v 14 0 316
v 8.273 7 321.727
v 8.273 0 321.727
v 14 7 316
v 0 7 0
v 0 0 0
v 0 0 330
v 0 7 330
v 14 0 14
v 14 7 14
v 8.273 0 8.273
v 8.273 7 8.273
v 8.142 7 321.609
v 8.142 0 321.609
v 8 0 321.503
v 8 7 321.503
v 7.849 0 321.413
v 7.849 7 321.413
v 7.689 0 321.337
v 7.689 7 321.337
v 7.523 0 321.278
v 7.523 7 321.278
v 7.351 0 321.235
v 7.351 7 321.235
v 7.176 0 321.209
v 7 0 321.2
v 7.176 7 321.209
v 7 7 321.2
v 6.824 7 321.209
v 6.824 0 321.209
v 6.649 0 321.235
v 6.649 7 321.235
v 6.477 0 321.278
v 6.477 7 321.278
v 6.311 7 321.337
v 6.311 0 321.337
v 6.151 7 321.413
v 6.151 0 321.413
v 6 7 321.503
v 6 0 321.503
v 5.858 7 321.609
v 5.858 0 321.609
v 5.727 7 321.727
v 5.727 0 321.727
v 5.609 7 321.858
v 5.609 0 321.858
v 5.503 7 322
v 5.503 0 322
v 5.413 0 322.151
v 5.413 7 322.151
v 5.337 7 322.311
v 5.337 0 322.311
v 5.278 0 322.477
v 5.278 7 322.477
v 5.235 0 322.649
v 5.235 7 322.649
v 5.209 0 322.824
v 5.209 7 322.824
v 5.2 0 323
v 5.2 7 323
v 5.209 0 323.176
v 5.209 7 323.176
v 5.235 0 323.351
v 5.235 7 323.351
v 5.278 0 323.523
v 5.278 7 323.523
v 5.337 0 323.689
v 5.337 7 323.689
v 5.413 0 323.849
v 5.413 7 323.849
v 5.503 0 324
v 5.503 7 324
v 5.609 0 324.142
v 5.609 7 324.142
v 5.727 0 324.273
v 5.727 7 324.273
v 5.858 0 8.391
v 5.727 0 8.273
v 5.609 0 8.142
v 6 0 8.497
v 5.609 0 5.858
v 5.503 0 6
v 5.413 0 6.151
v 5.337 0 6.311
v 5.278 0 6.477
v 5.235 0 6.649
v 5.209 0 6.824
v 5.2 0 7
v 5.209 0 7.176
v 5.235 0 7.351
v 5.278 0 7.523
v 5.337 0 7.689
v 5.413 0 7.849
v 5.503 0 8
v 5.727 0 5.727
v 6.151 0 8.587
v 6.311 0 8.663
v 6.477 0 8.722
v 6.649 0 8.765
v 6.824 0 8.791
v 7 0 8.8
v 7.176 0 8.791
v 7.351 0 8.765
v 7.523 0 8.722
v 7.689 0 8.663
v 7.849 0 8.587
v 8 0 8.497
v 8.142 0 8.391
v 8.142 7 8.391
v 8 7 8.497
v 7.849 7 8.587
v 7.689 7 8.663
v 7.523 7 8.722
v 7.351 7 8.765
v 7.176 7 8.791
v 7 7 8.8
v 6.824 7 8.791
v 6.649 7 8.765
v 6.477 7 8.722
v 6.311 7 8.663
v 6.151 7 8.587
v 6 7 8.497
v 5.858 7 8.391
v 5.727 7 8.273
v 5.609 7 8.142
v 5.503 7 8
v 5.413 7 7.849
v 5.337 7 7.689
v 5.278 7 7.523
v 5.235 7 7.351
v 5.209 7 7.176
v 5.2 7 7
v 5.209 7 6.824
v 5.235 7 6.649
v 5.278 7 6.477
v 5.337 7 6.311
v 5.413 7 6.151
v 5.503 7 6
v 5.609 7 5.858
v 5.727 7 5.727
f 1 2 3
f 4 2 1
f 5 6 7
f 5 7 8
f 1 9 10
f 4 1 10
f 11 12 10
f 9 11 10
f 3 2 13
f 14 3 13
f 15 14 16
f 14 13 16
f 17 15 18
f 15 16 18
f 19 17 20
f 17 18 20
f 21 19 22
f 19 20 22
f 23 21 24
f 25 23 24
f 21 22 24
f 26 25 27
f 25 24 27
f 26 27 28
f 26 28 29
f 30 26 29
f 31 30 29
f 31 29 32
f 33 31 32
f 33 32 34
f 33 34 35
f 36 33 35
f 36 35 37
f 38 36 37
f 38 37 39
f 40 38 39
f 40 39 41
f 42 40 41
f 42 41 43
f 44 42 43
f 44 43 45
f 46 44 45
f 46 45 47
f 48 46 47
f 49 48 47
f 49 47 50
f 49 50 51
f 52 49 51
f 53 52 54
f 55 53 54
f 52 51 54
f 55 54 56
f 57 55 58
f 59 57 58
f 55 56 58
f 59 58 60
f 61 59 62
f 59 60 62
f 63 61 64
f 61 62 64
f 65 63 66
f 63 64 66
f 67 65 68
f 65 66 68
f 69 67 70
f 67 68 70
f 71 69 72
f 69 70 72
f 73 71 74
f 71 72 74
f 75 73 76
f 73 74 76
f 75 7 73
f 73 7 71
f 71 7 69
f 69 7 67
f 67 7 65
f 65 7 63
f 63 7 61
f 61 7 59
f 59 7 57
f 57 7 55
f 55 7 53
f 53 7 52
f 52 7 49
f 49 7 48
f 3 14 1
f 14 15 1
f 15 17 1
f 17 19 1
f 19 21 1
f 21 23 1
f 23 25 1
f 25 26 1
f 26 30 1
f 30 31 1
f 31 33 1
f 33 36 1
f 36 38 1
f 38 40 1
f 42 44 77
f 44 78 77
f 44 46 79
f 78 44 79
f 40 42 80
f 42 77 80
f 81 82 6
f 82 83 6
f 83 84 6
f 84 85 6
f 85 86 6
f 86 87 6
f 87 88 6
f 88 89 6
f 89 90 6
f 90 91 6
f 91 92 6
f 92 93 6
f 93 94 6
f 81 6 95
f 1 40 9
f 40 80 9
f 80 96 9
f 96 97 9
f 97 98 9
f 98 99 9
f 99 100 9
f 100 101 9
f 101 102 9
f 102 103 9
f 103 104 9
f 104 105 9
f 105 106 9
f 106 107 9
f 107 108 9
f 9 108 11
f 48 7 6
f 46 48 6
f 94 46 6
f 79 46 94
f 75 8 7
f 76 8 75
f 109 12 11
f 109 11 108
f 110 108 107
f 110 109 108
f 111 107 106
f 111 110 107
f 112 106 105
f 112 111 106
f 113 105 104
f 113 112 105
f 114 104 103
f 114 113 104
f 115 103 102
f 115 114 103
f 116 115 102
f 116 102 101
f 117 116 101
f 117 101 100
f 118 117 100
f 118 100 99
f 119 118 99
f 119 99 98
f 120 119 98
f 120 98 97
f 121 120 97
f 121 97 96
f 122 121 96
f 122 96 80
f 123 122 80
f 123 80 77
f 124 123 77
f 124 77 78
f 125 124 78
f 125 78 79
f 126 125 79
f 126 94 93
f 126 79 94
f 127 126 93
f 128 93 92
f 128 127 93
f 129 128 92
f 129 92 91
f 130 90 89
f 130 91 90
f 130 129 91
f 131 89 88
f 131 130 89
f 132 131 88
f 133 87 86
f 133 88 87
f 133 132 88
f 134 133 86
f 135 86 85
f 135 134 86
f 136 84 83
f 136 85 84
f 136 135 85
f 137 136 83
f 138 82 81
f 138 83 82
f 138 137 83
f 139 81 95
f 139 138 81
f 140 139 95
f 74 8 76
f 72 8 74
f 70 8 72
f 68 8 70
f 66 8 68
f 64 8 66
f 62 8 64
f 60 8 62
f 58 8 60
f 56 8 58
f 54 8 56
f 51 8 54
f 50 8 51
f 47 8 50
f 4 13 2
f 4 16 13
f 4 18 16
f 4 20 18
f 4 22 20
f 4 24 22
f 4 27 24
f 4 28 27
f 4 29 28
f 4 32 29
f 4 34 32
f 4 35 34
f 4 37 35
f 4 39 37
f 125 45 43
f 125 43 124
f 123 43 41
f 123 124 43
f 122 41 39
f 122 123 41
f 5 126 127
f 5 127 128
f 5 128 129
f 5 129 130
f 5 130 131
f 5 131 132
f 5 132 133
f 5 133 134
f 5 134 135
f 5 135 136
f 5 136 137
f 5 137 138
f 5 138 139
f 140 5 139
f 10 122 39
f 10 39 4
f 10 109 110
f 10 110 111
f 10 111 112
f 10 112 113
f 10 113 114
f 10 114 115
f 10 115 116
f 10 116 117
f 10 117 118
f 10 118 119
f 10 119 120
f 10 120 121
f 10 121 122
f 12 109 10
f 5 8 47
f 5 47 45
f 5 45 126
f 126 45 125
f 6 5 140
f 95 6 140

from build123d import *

# Parameters (mm, degrees)
SKETCH1_W           = 14
SKETCH1_H           = 7
BOSS_EXTRUDE1_DEPTH = 330
CUT_EXTRUDE1_DEPTH  = 8
CUT_EXTRUDE2_DEPTH  = 8


with BuildPart() as part:
    # Sketch1 → Boss-Extrude1 (new body)
    with BuildSketch(Plane.XY):
        with Locations((7, 3.5)):
            Rectangle(SKETCH1_W, SKETCH1_H)
    extrude(amount=BOSS_EXTRUDE1_DEPTH)

    # Sketch2 → Cut-Extrude1 (cut, through all)
    with BuildSketch(Plane(origin=(0, 7, 0), x_dir=(1, 0, 0), z_dir=(0, 1, 0))):
        Polygon((0, 0), (14, -14), (14, 0), align=None)
        Polygon((14, -330), (0, -330), (14, -316), align=None)
    extrude(amount=-CUT_EXTRUDE1_DEPTH, mode=Mode.SUBTRACT)

    # Sketch3 → Cut-Extrude2 (cut, through all)
    with BuildSketch(Plane(origin=(0, 7, 0), x_dir=(1, 0, 0), z_dir=(0, 1, 0))):
        with BuildLine():
            Line((5.727207794, -5.727207794), (8.272792206, -8.272792206))
            ThreePointArc((8.272792206, -8.272792206), (5.727207794, -8.272792206), (5.727207794, -5.727207794))
        make_face()
        with BuildLine():
            Line((5.727207794, -324.272792206), (8.272792206, -321.727207794))
            ThreePointArc((8.272792206, -321.727207794), (5.727207794, -321.727207794), (5.727207794, -324.272792206))
        make_face()
    extrude(amount=-CUT_EXTRUDE2_DEPTH, mode=Mode.SUBTRACT)


solid = part.part
